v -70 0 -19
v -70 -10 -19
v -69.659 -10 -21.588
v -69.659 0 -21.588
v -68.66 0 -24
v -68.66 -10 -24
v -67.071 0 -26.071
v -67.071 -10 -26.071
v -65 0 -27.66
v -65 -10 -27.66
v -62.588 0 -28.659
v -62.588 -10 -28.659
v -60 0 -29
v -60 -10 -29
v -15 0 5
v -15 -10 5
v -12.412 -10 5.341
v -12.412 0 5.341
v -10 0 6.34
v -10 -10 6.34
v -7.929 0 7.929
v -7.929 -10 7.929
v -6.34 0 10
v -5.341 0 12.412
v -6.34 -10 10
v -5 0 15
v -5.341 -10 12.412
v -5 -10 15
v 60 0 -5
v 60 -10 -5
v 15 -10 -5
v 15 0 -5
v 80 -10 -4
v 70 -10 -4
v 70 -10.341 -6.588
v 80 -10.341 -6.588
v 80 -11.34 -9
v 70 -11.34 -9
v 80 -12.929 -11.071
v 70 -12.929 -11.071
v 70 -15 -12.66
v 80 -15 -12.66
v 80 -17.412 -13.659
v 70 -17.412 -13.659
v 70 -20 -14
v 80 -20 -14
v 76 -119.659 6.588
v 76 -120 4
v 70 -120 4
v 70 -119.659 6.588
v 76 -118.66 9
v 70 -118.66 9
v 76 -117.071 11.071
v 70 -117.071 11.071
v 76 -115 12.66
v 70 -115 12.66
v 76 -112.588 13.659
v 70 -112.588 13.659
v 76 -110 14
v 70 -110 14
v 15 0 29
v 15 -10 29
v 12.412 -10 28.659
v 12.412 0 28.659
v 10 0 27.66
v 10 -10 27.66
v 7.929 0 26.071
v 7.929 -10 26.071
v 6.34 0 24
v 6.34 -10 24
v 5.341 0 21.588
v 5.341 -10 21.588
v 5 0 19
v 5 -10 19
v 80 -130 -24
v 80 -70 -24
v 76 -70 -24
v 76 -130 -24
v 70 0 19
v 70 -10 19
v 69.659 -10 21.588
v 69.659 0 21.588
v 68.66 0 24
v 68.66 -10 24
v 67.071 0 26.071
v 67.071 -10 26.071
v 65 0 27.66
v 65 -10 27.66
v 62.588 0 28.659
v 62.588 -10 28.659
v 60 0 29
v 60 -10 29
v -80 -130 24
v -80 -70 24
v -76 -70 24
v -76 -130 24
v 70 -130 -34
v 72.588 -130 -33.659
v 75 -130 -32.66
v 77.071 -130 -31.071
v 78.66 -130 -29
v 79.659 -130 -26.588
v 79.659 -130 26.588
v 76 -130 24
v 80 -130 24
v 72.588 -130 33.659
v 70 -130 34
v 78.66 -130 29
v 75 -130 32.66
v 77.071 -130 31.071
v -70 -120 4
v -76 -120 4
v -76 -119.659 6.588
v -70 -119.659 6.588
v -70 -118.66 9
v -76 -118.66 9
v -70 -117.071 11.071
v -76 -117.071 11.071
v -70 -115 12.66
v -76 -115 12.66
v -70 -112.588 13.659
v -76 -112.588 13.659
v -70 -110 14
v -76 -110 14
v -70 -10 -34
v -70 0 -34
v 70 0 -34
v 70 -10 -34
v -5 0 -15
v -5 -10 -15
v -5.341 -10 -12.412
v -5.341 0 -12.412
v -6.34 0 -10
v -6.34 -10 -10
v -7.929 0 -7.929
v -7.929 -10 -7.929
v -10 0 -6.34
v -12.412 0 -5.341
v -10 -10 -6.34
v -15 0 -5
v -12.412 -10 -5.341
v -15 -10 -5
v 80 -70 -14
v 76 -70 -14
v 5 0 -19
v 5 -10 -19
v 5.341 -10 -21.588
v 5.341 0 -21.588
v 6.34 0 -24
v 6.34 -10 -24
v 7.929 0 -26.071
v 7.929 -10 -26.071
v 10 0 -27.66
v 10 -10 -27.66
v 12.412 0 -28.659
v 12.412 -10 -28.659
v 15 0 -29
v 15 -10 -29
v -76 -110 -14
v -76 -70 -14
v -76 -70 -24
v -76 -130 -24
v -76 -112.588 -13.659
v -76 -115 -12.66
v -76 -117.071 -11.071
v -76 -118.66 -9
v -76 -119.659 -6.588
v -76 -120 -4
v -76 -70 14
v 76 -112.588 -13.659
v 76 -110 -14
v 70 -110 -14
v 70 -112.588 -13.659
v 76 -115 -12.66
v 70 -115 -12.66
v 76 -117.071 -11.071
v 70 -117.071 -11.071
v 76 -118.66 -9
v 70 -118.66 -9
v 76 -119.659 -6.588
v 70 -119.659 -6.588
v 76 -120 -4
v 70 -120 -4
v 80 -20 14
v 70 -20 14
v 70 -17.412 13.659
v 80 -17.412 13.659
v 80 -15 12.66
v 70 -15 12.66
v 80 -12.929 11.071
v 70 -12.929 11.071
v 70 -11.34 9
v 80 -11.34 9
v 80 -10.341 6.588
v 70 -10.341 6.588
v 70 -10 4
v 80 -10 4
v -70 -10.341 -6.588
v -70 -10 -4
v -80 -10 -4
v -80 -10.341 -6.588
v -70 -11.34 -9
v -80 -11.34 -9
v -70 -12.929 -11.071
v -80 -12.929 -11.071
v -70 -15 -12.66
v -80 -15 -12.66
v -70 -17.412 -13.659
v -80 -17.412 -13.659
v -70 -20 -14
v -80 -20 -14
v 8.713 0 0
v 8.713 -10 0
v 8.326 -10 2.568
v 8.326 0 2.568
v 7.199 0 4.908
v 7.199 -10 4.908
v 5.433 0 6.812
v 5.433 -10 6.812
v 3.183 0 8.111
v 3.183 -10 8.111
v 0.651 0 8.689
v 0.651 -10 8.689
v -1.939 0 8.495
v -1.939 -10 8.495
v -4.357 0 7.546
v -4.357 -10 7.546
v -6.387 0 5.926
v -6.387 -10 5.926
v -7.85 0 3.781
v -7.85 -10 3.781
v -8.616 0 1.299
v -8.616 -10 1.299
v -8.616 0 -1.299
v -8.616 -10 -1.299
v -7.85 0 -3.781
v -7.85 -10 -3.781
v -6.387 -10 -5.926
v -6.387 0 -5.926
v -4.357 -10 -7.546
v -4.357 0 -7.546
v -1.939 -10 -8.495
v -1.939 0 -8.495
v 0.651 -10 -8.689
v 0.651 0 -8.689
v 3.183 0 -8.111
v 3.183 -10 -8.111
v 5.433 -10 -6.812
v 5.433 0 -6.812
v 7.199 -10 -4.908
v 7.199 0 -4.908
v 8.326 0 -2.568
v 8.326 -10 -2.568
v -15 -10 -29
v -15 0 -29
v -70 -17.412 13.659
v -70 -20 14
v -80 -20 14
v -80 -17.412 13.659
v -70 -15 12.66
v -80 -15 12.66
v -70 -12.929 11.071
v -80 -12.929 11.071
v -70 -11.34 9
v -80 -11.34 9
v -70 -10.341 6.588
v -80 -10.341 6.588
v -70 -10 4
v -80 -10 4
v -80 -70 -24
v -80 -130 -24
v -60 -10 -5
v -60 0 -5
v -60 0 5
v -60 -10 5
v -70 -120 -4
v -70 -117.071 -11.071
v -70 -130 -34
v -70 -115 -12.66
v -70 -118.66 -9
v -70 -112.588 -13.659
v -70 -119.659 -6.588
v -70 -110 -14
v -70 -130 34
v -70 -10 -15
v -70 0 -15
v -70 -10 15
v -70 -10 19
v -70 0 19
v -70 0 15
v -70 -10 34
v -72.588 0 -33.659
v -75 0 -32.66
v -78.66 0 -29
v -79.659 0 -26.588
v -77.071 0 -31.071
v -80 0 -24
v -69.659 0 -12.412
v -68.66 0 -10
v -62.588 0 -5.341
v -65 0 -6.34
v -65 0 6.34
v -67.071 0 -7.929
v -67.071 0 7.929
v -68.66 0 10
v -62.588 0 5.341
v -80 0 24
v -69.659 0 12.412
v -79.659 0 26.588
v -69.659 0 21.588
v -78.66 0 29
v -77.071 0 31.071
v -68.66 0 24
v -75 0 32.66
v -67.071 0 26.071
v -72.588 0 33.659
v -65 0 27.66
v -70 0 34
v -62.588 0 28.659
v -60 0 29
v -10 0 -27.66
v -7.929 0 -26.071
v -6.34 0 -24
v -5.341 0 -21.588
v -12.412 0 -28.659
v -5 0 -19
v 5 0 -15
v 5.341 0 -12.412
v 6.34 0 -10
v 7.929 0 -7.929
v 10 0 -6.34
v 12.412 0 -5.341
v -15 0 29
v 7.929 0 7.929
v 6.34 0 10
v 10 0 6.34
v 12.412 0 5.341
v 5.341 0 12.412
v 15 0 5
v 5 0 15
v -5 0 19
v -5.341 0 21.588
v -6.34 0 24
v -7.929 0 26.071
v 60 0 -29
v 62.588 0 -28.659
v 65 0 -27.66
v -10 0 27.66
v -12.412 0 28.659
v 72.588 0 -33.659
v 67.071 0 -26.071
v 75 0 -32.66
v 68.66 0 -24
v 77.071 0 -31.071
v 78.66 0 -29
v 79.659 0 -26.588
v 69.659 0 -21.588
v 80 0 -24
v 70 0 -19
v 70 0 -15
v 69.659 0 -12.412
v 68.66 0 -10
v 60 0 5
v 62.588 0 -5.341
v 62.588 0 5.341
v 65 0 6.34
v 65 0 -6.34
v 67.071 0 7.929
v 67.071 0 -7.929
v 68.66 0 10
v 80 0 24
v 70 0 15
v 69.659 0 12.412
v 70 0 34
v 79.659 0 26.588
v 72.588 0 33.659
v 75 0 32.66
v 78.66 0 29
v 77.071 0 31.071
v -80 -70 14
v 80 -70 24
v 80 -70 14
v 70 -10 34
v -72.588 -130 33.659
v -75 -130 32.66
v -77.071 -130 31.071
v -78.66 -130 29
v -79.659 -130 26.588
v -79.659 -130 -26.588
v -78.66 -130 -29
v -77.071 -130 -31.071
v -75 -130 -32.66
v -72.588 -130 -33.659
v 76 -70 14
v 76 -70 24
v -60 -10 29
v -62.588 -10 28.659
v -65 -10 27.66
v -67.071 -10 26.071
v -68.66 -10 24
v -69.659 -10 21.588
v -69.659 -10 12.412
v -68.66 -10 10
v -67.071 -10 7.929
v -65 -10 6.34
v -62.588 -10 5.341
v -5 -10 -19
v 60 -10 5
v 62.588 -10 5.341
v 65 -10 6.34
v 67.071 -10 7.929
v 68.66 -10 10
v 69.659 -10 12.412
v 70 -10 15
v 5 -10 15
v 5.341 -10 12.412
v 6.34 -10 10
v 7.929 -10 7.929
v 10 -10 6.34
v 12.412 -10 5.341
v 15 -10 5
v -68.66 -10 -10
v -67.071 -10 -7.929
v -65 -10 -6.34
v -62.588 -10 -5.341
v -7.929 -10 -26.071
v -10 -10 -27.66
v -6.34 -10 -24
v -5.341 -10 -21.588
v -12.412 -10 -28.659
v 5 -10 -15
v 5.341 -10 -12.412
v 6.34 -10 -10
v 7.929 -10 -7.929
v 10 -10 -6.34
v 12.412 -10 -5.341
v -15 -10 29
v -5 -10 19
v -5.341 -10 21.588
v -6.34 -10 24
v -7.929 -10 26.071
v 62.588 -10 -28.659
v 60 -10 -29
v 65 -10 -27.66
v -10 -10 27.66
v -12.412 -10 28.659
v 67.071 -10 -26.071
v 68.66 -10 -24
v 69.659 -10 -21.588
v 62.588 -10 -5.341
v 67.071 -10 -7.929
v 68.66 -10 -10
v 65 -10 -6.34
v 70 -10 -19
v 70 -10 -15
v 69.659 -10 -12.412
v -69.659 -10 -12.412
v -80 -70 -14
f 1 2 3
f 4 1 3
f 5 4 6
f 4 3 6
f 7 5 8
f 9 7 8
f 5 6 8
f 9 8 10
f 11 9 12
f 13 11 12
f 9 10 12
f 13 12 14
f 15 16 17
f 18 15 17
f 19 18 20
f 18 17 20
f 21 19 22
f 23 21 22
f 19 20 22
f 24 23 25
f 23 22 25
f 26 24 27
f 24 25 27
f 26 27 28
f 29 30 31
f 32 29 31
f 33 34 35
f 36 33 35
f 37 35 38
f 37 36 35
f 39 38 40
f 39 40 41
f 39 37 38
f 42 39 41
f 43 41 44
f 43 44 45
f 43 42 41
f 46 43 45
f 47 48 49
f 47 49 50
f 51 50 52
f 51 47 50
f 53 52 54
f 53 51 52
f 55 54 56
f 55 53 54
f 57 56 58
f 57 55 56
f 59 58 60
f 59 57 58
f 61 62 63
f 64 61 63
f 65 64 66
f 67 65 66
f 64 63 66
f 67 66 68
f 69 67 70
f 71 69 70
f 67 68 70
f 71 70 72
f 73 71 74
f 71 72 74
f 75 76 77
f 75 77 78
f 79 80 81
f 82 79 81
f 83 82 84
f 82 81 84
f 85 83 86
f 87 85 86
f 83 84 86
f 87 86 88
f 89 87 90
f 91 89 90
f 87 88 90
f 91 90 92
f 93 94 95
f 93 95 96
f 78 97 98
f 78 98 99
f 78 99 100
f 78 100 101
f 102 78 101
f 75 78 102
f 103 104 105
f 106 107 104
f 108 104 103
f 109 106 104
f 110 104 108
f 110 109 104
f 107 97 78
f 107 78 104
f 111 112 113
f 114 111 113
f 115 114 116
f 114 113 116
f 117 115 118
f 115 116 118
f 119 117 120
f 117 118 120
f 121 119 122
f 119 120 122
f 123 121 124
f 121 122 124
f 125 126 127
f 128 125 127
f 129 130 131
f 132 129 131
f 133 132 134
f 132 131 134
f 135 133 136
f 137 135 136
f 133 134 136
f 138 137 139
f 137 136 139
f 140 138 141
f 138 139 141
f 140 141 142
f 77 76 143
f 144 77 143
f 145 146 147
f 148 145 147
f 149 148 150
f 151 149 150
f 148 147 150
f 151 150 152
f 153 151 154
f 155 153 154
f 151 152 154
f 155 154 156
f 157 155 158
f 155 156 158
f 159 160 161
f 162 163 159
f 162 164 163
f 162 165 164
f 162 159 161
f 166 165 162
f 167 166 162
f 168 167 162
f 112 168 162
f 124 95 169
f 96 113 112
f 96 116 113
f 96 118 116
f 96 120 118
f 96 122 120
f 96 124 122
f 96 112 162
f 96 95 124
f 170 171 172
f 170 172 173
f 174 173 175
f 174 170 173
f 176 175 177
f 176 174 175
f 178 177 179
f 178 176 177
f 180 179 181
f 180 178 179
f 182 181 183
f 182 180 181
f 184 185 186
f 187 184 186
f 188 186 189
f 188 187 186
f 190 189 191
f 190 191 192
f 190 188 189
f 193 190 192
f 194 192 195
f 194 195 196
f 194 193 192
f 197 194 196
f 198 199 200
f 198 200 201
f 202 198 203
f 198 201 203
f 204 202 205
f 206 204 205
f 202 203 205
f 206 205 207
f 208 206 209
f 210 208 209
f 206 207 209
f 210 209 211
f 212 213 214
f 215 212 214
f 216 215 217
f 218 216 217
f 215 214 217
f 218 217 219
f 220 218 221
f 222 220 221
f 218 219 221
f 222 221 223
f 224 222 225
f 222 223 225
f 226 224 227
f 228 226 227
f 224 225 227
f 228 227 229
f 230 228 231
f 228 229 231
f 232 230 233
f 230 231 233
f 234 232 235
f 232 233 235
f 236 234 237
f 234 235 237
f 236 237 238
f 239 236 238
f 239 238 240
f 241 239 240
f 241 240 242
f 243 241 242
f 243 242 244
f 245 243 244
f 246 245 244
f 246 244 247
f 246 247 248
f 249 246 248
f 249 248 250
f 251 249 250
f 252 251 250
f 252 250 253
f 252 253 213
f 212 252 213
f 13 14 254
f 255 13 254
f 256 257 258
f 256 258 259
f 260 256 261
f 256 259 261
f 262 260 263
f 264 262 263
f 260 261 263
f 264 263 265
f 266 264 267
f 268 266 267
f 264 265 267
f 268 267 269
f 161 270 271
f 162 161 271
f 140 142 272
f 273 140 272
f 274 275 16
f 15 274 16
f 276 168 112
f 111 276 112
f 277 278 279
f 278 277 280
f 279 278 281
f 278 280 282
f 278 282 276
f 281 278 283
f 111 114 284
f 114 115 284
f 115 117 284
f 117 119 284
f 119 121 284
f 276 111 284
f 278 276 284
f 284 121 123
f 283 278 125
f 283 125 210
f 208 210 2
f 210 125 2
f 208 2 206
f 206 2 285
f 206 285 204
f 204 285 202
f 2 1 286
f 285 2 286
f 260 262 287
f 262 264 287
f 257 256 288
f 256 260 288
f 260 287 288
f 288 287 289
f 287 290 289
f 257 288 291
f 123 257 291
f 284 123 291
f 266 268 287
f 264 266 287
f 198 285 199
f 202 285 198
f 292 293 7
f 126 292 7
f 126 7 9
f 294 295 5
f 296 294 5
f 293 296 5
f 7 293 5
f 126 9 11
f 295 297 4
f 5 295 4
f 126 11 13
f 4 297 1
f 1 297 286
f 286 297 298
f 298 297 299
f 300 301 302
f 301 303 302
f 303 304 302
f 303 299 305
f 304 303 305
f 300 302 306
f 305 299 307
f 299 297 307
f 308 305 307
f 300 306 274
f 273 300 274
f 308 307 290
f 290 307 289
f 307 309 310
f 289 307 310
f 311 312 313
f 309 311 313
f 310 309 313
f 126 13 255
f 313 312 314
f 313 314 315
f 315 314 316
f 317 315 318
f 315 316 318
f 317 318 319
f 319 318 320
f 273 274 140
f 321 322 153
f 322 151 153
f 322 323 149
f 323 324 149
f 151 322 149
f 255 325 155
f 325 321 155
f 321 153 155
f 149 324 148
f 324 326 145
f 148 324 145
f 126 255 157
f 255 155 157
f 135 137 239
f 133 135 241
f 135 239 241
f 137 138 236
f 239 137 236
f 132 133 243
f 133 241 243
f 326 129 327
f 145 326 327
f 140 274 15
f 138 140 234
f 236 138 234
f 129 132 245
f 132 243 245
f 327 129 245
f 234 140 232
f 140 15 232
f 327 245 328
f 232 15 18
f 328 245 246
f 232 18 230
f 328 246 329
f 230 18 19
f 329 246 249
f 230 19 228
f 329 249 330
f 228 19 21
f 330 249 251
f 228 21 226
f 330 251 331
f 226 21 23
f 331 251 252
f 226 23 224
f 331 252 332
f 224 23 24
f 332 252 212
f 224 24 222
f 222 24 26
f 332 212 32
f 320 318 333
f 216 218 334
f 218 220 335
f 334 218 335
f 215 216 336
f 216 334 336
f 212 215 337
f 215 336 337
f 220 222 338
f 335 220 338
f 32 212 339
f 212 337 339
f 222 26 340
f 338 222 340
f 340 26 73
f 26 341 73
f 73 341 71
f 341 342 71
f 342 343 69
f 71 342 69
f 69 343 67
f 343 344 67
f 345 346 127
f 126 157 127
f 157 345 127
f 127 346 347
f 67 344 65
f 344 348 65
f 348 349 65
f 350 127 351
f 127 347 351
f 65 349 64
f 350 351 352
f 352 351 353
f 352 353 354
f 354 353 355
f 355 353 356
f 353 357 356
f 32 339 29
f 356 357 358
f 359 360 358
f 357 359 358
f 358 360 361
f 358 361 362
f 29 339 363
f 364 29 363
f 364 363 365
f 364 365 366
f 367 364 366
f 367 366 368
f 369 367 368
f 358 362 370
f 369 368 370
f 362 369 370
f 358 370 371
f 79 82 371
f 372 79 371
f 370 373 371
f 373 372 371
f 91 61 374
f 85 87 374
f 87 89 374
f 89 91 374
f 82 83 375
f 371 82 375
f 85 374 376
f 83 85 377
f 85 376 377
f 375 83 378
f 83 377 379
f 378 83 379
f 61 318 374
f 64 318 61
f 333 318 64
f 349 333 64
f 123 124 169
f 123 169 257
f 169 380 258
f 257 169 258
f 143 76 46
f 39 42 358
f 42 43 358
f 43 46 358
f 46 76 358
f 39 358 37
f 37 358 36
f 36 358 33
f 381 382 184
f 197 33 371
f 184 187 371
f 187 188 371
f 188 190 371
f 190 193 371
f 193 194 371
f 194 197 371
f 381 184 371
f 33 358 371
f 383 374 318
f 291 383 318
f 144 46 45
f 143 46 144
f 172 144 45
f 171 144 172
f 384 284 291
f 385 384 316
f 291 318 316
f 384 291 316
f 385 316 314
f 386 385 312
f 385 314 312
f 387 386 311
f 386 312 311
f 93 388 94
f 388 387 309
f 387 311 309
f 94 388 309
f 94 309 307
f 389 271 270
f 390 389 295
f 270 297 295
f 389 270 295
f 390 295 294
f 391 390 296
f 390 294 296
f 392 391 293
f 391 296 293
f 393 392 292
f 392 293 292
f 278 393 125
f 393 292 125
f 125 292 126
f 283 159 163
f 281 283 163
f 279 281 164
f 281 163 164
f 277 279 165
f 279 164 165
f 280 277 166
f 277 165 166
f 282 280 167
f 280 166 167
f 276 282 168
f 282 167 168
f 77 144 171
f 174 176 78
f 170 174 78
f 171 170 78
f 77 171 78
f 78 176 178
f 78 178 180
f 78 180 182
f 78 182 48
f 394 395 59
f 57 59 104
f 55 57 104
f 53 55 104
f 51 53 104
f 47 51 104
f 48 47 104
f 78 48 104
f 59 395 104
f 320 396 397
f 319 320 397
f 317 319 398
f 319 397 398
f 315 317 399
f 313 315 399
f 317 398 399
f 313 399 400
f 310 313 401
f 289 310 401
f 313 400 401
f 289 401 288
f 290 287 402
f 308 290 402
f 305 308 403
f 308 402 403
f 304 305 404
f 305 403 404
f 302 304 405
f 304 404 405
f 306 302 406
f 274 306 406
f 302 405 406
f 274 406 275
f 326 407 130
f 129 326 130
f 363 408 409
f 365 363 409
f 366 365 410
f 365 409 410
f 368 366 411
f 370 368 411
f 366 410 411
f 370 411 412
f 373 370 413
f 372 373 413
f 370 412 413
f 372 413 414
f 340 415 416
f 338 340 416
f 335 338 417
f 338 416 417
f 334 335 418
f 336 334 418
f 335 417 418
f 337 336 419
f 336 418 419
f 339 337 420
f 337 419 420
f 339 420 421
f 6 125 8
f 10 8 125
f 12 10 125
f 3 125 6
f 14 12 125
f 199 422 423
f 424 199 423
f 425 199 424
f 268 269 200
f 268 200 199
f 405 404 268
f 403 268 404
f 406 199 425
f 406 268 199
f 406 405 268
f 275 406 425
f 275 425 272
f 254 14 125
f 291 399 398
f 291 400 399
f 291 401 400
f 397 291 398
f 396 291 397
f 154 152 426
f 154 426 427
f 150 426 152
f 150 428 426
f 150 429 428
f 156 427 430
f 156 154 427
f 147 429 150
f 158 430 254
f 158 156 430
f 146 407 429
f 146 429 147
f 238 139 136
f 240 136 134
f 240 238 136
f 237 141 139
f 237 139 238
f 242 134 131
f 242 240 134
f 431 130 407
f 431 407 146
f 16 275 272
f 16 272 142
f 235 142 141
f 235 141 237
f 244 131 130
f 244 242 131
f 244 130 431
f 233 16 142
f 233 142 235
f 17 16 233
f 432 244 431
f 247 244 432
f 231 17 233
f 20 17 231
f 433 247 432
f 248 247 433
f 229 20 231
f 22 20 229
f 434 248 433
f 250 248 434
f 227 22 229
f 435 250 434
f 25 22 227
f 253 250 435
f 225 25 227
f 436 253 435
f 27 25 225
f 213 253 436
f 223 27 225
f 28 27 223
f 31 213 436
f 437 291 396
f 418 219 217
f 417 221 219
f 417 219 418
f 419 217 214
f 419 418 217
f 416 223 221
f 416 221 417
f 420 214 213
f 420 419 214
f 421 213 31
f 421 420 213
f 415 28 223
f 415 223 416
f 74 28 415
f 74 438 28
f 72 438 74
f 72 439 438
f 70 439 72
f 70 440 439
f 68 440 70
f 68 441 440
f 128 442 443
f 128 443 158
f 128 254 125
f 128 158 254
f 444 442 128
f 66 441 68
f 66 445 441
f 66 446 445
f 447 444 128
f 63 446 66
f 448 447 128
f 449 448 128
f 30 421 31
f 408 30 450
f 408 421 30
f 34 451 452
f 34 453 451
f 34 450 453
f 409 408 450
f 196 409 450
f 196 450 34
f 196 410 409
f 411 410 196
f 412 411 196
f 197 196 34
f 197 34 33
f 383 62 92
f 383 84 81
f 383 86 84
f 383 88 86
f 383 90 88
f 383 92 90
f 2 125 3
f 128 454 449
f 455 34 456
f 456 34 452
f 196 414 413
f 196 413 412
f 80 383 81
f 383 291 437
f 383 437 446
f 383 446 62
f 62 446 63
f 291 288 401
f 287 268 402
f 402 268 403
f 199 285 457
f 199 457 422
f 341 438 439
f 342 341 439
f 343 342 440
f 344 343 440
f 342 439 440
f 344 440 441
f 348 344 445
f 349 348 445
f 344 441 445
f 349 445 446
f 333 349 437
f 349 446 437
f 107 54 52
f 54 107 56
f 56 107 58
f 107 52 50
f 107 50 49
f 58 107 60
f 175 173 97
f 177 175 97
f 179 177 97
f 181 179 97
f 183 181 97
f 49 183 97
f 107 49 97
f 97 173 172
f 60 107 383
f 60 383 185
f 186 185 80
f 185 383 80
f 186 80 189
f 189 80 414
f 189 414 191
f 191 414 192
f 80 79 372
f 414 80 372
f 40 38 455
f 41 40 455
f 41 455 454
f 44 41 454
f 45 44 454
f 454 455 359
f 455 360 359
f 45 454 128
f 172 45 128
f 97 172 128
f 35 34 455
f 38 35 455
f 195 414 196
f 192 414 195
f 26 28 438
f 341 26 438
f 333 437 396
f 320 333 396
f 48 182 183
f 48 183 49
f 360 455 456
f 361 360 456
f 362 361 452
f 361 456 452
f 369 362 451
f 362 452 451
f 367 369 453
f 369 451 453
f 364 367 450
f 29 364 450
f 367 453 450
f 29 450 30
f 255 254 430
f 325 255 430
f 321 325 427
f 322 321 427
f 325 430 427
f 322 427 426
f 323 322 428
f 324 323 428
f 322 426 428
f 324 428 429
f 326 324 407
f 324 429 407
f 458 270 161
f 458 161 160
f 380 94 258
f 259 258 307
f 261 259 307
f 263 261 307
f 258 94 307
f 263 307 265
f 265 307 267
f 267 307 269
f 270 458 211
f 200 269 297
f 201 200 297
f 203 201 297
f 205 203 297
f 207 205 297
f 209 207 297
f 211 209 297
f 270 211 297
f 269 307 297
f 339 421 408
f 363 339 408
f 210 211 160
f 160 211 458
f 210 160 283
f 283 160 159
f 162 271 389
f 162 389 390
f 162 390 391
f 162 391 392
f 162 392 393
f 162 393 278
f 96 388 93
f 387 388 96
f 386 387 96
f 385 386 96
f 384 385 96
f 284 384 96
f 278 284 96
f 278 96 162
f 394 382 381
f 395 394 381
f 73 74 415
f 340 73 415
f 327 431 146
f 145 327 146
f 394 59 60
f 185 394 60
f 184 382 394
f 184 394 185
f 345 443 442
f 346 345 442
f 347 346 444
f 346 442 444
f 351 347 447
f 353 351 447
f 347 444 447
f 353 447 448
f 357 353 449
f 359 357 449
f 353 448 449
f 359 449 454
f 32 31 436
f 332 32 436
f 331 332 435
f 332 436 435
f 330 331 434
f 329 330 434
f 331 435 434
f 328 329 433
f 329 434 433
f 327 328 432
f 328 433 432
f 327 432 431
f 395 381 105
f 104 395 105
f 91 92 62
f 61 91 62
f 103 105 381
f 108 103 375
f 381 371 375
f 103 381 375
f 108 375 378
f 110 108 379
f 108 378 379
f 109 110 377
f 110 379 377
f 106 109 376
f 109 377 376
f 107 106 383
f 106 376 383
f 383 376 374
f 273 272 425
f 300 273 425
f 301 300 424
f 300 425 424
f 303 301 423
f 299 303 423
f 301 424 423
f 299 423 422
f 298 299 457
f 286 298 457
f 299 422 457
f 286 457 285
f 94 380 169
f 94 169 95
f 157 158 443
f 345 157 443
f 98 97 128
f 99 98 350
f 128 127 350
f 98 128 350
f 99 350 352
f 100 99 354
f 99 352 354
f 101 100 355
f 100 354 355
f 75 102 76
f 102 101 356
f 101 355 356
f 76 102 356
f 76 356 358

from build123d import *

# Parameters (mm, degrees)
F1_DEPTH  = 10
F2_R      = 8.7132034356
F3_DEPTH  = 11
F4_DEPTH  = 11
F6_DEPTH  = 120
F7_W      = 60
F7_H      = 48
F8_DEPTH  = 4
F10_DEPTH = 10


# Not quite as in the source:
# - a pattern or mirror of a feature is missing from the dataset's text; its kind, count and spacing are read off the source's solid


with BuildPart() as f1:
    # F0 (on Front) → F1 (new body)
    with BuildSketch(Plane.XZ):
        with BuildLine():
            Line((-70, -34), (70, -34))
            ThreePointArc((70, -34), (77.0710678119, -31.0710678119), (80, -24))
            Line((80, -24), (80, 24))
            ThreePointArc((80, 24), (77.0710678119, 31.0710678119), (70, 34))
            Line((70, 34), (-70, 34))
            ThreePointArc((-70, 34), (-77.0710678119, 31.0710678119), (-80, 24))
            Line((-80, 24), (-80, -24))
            ThreePointArc((-80, -24), (-77.0710678119, -31.0710678119), (-70, -34))
        make_face()
    extrude(amount=F1_DEPTH)

    # F2 (on face) → F3 (cut)
    with BuildSketch(Plane.XZ.offset(10)):
        with BuildLine():
            Line((15, 5), (60, 5))
            ThreePointArc((60, 5), (67.0710678119, 7.9289321881), (70, 15))
            Line((70, 15), (70, 19))
            ThreePointArc((70, 19), (67.0710678119, 26.0710678119), (60, 29))
            Line((60, 29), (15, 29))
            ThreePointArc((15, 29), (7.9289321881, 26.0710678119), (5, 19))
            Line((5, 19), (5, 15))
            ThreePointArc((5, 15), (7.9289321881, 7.9289321881), (15, 5))
        make_face()
        with BuildLine():
            ThreePointArc((70, -15), (67.0710678119, -7.9289321881), (60, -5))
            Line((60, -5), (15, -5))
            ThreePointArc((15, -5), (7.9289321881, -7.9289321881), (5, -15))
            Line((5, -15), (5, -19))
            ThreePointArc((5, -19), (7.9289321881, -26.0710678119), (15, -29))
            Line((15, -29), (60, -29))
            ThreePointArc((60, -29), (67.0710678119, -26.0710678119), (70, -19))
            Line((70, -19), (70, -15))
        make_face()
        with BuildLine():
            Line((-15, -5), (-60, -5))
            ThreePointArc((-60, -5), (-67.0710678119, -7.9289321881), (-70, -15))
            Line((-70, -15), (-70, -19))
            ThreePointArc((-70, -19), (-67.0710678119, -26.0710678119), (-60, -29))
            Line((-60, -29), (-15, -29))
            ThreePointArc((-15, -29), (-7.9289321881, -26.0710678119), (-5, -19))
            Line((-5, -19), (-5, -15))
            ThreePointArc((-5, -15), (-7.9289321881, -7.9289321881), (-15, -5))
        make_face()
        with BuildLine():
            ThreePointArc((-5, 19), (-7.9289321881, 26.0710678119), (-15, 29))
            Line((-15, 29), (-60, 29))
            ThreePointArc((-60, 29), (-67.0710678119, 26.0710678119), (-70, 19))
            Line((-70, 19), (-70, 15))
            ThreePointArc((-70, 15), (-67.0710678119, 7.9289321881), (-60, 5))
            Line((-60, 5), (-15, 5))
            ThreePointArc((-15, 5), (-7.9289321881, 7.9289321881), (-5, 15))
            Line((-5, 15), (-5, 19))
        make_face()
        Circle(F2_R)
    extrude(amount=-F3_DEPTH, mode=Mode.SUBTRACT)

    # F2 (on face) → F4 (cut)
    with BuildSketch(Plane.XZ.offset(10)):
        with BuildLine():
            Line((15, 5), (60, 5))
            ThreePointArc((60, 5), (67.0710678119, 7.9289321881), (70, 15))
            Line((70, 15), (70, 19))
            ThreePointArc((70, 19), (67.0710678119, 26.0710678119), (60, 29))
            Line((60, 29), (15, 29))
            ThreePointArc((15, 29), (7.9289321881, 26.0710678119), (5, 19))
            Line((5, 19), (5, 15))
            ThreePointArc((5, 15), (7.9289321881, 7.9289321881), (15, 5))
        make_face()
        with BuildLine():
            ThreePointArc((70, -15), (67.0710678119, -7.9289321881), (60, -5))
            Line((60, -5), (15, -5))
            ThreePointArc((15, -5), (7.9289321881, -7.9289321881), (5, -15))
            Line((5, -15), (5, -19))
            ThreePointArc((5, -19), (7.9289321881, -26.0710678119), (15, -29))
            Line((15, -29), (60, -29))
            ThreePointArc((60, -29), (67.0710678119, -26.0710678119), (70, -19))
            Line((70, -19), (70, -15))
        make_face()
        with BuildLine():
            Line((-15, -5), (-60, -5))
            ThreePointArc((-60, -5), (-67.0710678119, -7.9289321881), (-70, -15))
            Line((-70, -15), (-70, -19))
            ThreePointArc((-70, -19), (-67.0710678119, -26.0710678119), (-60, -29))
            Line((-60, -29), (-15, -29))
            ThreePointArc((-15, -29), (-7.9289321881, -26.0710678119), (-5, -19))
            Line((-5, -19), (-5, -15))
            ThreePointArc((-5, -15), (-7.9289321881, -7.9289321881), (-15, -5))
        make_face()
        with BuildLine():
            ThreePointArc((-5, 19), (-7.9289321881, 26.0710678119), (-15, 29))
            Line((-15, 29), (-60, 29))
            ThreePointArc((-60, 29), (-67.0710678119, 26.0710678119), (-70, 19))
            Line((-70, 19), (-70, 15))
            ThreePointArc((-70, 15), (-67.0710678119, 7.9289321881), (-60, 5))
            Line((-60, 5), (-15, 5))
            ThreePointArc((-15, 5), (-7.9289321881, 7.9289321881), (-5, 15))
            Line((-5, 15), (-5, 19))
        make_face()
        Circle(F2_R)
    extrude(amount=-F4_DEPTH, mode=Mode.SUBTRACT)

    # F5 (on face) → F6 (join)
    with BuildSketch(Plane.XZ.offset(10)):
        with BuildLine():
            Line((70, 34), (70, -34))
            ThreePointArc((70, -34), (77.0710678119, -31.0710678119), (80, -24))
            Line((80, -24), (80, 24))
            ThreePointArc((80, 24), (77.0710678119, 31.0710678119), (70, 34))
        make_face()
        with BuildLine():
            ThreePointArc((-80, -24), (-77.0710678119, -31.0710678119), (-70, -34))
            Line((-70, -34), (-70, 34))
            ThreePointArc((-70, 34), (-77.0710678119, 31.0710678119), (-80, 24))
            Line((-80, 24), (-80, -24))
        make_face()
    extrude(amount=F6_DEPTH)

    # F7 (on face) → F8 (cut)
    with BuildSketch(Plane(origin=(-80, 0, 0), x_dir=(0, -1, 0), z_dir=(-1, 0, 0))):
        with Locations((100, 0)):
            Rectangle(F7_W, F7_H)
    f8 = extrude(amount=-F8_DEPTH, mode=Mode.SUBTRACT)

    # F8_copies: F8 across plane
    add(f8.mirror(Plane(origin=(0, 0, 0), x_dir=(0, 0, 1), z_dir=(1, 0, 0))), mode=Mode.SUBTRACT)

    # F9 (on face) → F10 (cut)
    with BuildSketch(Plane(origin=(-80, 0, 0), x_dir=(0, -1, 0), z_dir=(-1, 0, 0))):
        with BuildLine():
            Line((20, -14), (110, -14))
            ThreePointArc((110, -14), (117.0710678119, -11.0710678119), (120, -4))
            Line((120, -4), (120, 4))
            ThreePointArc((120, 4), (117.0710678119, 11.0710678119), (110, 14))
            Line((110, 14), (20, 14))
            ThreePointArc((20, 14), (12.9289321881, 11.0710678119), (10, 4))
            Line((10, 4), (10, -4))
            ThreePointArc((10, -4), (12.9289321881, -11.0710678119), (20, -14))
        make_face()
    f10 = extrude(amount=-F10_DEPTH, mode=Mode.SUBTRACT)

    # F10_copies: F10 across plane
    add(f10.mirror(Plane(origin=(0, 0, 0), x_dir=(0, 0, 1), z_dir=(1, 0, 0))), mode=Mode.SUBTRACT)


solid = f1.part
